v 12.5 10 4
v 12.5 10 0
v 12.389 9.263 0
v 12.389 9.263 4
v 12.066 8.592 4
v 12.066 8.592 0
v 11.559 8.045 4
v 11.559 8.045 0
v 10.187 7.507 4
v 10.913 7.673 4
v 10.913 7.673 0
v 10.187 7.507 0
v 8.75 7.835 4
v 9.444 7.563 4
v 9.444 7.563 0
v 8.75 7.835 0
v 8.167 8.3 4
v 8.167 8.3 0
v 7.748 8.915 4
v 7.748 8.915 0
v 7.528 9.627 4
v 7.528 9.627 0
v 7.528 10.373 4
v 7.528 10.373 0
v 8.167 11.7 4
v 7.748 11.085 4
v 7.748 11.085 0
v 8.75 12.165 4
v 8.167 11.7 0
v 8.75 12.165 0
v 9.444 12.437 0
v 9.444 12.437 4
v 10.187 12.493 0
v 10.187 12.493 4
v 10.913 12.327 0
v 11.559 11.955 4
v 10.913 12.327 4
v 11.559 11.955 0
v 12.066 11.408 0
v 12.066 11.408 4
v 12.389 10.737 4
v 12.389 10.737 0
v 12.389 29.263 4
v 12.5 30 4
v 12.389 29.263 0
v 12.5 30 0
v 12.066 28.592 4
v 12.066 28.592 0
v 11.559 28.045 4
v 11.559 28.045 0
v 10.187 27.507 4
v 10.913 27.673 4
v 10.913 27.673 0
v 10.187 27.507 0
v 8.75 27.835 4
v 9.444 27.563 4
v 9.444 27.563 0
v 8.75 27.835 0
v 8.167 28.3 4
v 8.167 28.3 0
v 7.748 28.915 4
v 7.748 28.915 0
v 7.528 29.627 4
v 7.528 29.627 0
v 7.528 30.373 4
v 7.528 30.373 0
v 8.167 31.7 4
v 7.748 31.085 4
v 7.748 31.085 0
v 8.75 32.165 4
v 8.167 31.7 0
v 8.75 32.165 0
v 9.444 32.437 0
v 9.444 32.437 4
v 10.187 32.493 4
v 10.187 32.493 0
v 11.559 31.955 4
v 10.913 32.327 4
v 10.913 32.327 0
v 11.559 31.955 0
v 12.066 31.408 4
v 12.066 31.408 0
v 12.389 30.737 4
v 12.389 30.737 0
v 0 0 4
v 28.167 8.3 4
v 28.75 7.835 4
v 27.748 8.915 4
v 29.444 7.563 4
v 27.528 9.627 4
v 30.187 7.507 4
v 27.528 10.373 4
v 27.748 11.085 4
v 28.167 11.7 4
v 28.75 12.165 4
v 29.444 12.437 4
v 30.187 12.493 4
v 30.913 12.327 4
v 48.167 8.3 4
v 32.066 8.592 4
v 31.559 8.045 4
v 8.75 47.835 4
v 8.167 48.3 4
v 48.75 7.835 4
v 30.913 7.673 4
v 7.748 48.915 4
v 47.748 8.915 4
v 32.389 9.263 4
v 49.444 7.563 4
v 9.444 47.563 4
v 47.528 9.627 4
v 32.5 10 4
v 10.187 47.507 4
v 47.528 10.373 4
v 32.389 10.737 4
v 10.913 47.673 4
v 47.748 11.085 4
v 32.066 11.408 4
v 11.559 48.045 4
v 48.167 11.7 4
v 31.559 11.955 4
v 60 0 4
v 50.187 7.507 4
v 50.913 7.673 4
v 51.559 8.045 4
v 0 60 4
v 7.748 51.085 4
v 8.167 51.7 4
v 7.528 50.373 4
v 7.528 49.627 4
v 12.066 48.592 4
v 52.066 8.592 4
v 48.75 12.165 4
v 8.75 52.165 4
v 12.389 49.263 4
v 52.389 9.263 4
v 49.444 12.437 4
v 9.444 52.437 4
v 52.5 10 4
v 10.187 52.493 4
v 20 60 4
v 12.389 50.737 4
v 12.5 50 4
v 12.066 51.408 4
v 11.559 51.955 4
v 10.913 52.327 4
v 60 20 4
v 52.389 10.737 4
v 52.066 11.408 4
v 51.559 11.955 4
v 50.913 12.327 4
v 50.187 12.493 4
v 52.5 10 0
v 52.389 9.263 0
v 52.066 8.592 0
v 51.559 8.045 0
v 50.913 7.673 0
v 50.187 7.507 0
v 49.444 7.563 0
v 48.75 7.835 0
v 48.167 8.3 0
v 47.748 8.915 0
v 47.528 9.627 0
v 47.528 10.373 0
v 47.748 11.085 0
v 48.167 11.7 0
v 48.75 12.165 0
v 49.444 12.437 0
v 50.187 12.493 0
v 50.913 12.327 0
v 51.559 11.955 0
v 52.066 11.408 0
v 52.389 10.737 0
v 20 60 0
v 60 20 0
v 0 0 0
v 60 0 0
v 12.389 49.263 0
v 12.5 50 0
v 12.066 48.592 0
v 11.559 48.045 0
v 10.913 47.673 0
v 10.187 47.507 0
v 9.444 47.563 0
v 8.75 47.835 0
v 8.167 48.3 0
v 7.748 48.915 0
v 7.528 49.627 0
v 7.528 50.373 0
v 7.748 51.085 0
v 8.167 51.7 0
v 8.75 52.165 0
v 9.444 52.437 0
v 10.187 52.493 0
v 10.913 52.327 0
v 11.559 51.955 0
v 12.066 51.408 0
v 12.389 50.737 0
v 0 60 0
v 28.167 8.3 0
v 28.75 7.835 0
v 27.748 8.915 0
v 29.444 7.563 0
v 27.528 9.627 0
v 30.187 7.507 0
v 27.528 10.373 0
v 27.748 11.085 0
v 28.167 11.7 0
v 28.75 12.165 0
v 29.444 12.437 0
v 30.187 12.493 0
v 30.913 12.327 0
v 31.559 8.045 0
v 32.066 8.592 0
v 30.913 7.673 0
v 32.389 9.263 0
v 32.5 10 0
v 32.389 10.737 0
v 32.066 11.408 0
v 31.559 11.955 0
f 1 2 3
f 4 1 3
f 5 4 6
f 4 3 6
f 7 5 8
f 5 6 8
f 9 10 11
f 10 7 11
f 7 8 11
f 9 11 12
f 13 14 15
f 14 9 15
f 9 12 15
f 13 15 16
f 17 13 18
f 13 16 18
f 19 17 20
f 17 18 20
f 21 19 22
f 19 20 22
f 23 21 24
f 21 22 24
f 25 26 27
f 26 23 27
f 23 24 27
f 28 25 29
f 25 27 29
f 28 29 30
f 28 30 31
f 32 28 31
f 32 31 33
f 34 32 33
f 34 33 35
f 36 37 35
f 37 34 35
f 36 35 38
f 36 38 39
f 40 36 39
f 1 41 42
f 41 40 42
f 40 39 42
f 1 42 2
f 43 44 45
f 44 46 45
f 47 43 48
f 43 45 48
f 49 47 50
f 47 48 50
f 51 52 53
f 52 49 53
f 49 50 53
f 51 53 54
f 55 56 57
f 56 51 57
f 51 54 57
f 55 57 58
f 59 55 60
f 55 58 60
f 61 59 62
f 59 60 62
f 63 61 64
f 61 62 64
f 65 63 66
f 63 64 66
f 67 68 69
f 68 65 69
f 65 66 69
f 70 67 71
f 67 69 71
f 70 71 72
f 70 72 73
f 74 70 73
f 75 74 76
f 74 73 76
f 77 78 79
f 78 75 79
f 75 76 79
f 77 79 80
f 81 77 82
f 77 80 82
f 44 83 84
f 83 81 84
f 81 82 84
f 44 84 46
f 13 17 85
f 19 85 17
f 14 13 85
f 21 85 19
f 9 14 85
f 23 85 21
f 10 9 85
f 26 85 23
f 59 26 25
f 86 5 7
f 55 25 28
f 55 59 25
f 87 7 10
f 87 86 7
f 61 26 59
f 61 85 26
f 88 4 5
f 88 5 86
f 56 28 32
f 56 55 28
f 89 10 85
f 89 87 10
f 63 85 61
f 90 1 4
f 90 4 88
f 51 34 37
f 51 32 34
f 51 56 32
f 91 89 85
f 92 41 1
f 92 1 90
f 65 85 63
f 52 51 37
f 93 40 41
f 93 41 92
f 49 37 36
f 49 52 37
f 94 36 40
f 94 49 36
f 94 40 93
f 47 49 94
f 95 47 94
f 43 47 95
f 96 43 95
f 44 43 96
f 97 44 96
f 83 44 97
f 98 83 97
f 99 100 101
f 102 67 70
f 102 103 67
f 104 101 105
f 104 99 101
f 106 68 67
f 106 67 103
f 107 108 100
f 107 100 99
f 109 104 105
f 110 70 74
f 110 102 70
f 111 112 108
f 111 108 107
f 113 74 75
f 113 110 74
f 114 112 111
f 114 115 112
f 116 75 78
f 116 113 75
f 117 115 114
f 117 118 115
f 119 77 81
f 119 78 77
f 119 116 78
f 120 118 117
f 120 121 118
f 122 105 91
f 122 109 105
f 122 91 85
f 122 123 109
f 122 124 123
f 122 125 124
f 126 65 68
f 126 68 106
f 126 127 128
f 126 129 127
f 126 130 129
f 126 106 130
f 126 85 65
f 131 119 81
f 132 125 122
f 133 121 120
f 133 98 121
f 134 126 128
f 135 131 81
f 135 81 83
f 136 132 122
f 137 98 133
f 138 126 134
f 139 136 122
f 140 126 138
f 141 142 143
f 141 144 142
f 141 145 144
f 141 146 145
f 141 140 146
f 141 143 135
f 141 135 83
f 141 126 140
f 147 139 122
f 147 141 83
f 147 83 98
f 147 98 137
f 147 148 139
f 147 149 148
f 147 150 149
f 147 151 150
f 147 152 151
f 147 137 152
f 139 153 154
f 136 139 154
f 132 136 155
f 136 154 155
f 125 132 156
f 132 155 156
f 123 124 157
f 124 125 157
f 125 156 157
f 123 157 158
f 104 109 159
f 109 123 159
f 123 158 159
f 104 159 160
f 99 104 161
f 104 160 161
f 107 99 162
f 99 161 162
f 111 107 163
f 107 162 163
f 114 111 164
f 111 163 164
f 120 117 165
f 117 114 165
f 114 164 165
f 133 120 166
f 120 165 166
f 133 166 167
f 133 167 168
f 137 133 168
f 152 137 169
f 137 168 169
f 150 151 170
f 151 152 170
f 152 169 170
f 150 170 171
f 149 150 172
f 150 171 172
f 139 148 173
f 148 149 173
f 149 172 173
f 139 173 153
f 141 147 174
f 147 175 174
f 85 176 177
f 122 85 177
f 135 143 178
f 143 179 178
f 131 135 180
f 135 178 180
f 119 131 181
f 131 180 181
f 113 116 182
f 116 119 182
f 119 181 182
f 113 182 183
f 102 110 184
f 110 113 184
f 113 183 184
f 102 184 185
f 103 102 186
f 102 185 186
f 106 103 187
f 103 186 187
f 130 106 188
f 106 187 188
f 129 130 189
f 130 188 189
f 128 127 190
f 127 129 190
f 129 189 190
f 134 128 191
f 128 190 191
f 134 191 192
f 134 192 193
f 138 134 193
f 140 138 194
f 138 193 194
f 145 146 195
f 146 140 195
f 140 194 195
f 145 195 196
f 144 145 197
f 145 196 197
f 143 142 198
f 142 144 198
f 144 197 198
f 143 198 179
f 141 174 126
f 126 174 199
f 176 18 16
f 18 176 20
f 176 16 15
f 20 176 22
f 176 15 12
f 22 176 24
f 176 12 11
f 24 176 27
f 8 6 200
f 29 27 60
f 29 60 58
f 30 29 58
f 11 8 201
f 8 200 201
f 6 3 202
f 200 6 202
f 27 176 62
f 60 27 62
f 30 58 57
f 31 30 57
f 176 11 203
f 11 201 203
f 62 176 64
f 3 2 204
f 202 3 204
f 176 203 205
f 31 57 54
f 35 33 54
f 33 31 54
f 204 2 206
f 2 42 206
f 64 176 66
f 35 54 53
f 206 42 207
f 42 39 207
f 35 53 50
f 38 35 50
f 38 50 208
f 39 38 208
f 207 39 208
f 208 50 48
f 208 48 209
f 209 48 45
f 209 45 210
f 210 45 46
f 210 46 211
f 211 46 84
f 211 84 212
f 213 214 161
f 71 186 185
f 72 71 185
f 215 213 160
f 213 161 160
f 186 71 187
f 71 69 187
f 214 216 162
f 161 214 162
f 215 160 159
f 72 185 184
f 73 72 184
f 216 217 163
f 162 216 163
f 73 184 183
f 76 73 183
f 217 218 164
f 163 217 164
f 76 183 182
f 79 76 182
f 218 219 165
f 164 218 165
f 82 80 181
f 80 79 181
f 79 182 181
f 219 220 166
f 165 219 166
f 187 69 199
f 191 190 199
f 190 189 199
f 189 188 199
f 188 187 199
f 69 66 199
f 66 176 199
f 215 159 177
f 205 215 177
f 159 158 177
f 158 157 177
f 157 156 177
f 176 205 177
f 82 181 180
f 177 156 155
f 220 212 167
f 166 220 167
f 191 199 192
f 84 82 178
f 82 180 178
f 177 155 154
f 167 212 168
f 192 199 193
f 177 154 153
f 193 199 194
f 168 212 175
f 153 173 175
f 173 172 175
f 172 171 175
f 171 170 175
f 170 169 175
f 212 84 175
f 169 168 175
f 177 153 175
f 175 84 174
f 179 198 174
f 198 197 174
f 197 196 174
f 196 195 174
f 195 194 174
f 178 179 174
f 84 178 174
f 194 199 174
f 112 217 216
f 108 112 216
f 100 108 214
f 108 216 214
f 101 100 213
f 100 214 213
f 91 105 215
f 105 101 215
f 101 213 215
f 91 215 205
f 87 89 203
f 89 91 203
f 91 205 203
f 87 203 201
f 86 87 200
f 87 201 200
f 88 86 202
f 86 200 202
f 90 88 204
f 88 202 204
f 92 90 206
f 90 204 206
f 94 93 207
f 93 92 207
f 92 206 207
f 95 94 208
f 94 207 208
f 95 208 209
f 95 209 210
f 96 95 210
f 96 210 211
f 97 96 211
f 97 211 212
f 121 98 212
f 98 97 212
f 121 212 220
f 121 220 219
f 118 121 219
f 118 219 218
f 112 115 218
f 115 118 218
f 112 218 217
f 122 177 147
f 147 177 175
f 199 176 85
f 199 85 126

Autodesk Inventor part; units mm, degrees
ref_plane "YZ Plane" through (0, 0, 0) normal (1, 0, 0) x (0, 1, 0)
ref_plane "XZ Plane" through (0, 0, 0) normal (0, 1, 0) x (-1, 0, 0)
ref_plane "XY Plane" through (0, 0, 0) normal (0, 0, 1) x (1, 0, 0)
sketch "Boceto1" plane through (0, 0, 0) normal (0, 0, 1) x (1, 0, 0)
  line L0 (190.1282, 320.5488) -> (475.893, 320.5488) construction
  line L1 (475.893, 320.5488) -> (475.893, 34.784) construction
  line L2 (475.893, 34.784) -> (190.1282, 34.784) construction
  line L3 (190.1282, 34.784) -> (190.1282, 320.5488) construction
  line L4 (0, 0) -> (0, 60)
  line L5 (0, 0) -> (60, 0)
  line L6 (60, 0) -> (60, 20)
  line L7 (60, 20) -> (20, 60)
  line L8 (20, 60) -> (0, 60)
  circle A0 centre (10, 50) radius 2.5
  circle A1 centre (10, 30) radius 2.5
  circle A2 centre (10, 10) radius 2.5
  circle A3 centre (30, 10) radius 2.5
  circle A4 centre (50, 10) radius 2.5
  point P0 (0, 30)
  point P1 (30, 0)
  dimension "d3" = 60
  dimension "d4" = 60
  dimension "d5" = 20
  dimension "d6" = 20
  dimension "d7" = 5
  dimension "d10" = 20
  dimension "d19" = 20
extrude "Extrusión1" add sketch "Boceto1" along normal blind 4
properties part number "LPlate" material "Aluminio 6061"
